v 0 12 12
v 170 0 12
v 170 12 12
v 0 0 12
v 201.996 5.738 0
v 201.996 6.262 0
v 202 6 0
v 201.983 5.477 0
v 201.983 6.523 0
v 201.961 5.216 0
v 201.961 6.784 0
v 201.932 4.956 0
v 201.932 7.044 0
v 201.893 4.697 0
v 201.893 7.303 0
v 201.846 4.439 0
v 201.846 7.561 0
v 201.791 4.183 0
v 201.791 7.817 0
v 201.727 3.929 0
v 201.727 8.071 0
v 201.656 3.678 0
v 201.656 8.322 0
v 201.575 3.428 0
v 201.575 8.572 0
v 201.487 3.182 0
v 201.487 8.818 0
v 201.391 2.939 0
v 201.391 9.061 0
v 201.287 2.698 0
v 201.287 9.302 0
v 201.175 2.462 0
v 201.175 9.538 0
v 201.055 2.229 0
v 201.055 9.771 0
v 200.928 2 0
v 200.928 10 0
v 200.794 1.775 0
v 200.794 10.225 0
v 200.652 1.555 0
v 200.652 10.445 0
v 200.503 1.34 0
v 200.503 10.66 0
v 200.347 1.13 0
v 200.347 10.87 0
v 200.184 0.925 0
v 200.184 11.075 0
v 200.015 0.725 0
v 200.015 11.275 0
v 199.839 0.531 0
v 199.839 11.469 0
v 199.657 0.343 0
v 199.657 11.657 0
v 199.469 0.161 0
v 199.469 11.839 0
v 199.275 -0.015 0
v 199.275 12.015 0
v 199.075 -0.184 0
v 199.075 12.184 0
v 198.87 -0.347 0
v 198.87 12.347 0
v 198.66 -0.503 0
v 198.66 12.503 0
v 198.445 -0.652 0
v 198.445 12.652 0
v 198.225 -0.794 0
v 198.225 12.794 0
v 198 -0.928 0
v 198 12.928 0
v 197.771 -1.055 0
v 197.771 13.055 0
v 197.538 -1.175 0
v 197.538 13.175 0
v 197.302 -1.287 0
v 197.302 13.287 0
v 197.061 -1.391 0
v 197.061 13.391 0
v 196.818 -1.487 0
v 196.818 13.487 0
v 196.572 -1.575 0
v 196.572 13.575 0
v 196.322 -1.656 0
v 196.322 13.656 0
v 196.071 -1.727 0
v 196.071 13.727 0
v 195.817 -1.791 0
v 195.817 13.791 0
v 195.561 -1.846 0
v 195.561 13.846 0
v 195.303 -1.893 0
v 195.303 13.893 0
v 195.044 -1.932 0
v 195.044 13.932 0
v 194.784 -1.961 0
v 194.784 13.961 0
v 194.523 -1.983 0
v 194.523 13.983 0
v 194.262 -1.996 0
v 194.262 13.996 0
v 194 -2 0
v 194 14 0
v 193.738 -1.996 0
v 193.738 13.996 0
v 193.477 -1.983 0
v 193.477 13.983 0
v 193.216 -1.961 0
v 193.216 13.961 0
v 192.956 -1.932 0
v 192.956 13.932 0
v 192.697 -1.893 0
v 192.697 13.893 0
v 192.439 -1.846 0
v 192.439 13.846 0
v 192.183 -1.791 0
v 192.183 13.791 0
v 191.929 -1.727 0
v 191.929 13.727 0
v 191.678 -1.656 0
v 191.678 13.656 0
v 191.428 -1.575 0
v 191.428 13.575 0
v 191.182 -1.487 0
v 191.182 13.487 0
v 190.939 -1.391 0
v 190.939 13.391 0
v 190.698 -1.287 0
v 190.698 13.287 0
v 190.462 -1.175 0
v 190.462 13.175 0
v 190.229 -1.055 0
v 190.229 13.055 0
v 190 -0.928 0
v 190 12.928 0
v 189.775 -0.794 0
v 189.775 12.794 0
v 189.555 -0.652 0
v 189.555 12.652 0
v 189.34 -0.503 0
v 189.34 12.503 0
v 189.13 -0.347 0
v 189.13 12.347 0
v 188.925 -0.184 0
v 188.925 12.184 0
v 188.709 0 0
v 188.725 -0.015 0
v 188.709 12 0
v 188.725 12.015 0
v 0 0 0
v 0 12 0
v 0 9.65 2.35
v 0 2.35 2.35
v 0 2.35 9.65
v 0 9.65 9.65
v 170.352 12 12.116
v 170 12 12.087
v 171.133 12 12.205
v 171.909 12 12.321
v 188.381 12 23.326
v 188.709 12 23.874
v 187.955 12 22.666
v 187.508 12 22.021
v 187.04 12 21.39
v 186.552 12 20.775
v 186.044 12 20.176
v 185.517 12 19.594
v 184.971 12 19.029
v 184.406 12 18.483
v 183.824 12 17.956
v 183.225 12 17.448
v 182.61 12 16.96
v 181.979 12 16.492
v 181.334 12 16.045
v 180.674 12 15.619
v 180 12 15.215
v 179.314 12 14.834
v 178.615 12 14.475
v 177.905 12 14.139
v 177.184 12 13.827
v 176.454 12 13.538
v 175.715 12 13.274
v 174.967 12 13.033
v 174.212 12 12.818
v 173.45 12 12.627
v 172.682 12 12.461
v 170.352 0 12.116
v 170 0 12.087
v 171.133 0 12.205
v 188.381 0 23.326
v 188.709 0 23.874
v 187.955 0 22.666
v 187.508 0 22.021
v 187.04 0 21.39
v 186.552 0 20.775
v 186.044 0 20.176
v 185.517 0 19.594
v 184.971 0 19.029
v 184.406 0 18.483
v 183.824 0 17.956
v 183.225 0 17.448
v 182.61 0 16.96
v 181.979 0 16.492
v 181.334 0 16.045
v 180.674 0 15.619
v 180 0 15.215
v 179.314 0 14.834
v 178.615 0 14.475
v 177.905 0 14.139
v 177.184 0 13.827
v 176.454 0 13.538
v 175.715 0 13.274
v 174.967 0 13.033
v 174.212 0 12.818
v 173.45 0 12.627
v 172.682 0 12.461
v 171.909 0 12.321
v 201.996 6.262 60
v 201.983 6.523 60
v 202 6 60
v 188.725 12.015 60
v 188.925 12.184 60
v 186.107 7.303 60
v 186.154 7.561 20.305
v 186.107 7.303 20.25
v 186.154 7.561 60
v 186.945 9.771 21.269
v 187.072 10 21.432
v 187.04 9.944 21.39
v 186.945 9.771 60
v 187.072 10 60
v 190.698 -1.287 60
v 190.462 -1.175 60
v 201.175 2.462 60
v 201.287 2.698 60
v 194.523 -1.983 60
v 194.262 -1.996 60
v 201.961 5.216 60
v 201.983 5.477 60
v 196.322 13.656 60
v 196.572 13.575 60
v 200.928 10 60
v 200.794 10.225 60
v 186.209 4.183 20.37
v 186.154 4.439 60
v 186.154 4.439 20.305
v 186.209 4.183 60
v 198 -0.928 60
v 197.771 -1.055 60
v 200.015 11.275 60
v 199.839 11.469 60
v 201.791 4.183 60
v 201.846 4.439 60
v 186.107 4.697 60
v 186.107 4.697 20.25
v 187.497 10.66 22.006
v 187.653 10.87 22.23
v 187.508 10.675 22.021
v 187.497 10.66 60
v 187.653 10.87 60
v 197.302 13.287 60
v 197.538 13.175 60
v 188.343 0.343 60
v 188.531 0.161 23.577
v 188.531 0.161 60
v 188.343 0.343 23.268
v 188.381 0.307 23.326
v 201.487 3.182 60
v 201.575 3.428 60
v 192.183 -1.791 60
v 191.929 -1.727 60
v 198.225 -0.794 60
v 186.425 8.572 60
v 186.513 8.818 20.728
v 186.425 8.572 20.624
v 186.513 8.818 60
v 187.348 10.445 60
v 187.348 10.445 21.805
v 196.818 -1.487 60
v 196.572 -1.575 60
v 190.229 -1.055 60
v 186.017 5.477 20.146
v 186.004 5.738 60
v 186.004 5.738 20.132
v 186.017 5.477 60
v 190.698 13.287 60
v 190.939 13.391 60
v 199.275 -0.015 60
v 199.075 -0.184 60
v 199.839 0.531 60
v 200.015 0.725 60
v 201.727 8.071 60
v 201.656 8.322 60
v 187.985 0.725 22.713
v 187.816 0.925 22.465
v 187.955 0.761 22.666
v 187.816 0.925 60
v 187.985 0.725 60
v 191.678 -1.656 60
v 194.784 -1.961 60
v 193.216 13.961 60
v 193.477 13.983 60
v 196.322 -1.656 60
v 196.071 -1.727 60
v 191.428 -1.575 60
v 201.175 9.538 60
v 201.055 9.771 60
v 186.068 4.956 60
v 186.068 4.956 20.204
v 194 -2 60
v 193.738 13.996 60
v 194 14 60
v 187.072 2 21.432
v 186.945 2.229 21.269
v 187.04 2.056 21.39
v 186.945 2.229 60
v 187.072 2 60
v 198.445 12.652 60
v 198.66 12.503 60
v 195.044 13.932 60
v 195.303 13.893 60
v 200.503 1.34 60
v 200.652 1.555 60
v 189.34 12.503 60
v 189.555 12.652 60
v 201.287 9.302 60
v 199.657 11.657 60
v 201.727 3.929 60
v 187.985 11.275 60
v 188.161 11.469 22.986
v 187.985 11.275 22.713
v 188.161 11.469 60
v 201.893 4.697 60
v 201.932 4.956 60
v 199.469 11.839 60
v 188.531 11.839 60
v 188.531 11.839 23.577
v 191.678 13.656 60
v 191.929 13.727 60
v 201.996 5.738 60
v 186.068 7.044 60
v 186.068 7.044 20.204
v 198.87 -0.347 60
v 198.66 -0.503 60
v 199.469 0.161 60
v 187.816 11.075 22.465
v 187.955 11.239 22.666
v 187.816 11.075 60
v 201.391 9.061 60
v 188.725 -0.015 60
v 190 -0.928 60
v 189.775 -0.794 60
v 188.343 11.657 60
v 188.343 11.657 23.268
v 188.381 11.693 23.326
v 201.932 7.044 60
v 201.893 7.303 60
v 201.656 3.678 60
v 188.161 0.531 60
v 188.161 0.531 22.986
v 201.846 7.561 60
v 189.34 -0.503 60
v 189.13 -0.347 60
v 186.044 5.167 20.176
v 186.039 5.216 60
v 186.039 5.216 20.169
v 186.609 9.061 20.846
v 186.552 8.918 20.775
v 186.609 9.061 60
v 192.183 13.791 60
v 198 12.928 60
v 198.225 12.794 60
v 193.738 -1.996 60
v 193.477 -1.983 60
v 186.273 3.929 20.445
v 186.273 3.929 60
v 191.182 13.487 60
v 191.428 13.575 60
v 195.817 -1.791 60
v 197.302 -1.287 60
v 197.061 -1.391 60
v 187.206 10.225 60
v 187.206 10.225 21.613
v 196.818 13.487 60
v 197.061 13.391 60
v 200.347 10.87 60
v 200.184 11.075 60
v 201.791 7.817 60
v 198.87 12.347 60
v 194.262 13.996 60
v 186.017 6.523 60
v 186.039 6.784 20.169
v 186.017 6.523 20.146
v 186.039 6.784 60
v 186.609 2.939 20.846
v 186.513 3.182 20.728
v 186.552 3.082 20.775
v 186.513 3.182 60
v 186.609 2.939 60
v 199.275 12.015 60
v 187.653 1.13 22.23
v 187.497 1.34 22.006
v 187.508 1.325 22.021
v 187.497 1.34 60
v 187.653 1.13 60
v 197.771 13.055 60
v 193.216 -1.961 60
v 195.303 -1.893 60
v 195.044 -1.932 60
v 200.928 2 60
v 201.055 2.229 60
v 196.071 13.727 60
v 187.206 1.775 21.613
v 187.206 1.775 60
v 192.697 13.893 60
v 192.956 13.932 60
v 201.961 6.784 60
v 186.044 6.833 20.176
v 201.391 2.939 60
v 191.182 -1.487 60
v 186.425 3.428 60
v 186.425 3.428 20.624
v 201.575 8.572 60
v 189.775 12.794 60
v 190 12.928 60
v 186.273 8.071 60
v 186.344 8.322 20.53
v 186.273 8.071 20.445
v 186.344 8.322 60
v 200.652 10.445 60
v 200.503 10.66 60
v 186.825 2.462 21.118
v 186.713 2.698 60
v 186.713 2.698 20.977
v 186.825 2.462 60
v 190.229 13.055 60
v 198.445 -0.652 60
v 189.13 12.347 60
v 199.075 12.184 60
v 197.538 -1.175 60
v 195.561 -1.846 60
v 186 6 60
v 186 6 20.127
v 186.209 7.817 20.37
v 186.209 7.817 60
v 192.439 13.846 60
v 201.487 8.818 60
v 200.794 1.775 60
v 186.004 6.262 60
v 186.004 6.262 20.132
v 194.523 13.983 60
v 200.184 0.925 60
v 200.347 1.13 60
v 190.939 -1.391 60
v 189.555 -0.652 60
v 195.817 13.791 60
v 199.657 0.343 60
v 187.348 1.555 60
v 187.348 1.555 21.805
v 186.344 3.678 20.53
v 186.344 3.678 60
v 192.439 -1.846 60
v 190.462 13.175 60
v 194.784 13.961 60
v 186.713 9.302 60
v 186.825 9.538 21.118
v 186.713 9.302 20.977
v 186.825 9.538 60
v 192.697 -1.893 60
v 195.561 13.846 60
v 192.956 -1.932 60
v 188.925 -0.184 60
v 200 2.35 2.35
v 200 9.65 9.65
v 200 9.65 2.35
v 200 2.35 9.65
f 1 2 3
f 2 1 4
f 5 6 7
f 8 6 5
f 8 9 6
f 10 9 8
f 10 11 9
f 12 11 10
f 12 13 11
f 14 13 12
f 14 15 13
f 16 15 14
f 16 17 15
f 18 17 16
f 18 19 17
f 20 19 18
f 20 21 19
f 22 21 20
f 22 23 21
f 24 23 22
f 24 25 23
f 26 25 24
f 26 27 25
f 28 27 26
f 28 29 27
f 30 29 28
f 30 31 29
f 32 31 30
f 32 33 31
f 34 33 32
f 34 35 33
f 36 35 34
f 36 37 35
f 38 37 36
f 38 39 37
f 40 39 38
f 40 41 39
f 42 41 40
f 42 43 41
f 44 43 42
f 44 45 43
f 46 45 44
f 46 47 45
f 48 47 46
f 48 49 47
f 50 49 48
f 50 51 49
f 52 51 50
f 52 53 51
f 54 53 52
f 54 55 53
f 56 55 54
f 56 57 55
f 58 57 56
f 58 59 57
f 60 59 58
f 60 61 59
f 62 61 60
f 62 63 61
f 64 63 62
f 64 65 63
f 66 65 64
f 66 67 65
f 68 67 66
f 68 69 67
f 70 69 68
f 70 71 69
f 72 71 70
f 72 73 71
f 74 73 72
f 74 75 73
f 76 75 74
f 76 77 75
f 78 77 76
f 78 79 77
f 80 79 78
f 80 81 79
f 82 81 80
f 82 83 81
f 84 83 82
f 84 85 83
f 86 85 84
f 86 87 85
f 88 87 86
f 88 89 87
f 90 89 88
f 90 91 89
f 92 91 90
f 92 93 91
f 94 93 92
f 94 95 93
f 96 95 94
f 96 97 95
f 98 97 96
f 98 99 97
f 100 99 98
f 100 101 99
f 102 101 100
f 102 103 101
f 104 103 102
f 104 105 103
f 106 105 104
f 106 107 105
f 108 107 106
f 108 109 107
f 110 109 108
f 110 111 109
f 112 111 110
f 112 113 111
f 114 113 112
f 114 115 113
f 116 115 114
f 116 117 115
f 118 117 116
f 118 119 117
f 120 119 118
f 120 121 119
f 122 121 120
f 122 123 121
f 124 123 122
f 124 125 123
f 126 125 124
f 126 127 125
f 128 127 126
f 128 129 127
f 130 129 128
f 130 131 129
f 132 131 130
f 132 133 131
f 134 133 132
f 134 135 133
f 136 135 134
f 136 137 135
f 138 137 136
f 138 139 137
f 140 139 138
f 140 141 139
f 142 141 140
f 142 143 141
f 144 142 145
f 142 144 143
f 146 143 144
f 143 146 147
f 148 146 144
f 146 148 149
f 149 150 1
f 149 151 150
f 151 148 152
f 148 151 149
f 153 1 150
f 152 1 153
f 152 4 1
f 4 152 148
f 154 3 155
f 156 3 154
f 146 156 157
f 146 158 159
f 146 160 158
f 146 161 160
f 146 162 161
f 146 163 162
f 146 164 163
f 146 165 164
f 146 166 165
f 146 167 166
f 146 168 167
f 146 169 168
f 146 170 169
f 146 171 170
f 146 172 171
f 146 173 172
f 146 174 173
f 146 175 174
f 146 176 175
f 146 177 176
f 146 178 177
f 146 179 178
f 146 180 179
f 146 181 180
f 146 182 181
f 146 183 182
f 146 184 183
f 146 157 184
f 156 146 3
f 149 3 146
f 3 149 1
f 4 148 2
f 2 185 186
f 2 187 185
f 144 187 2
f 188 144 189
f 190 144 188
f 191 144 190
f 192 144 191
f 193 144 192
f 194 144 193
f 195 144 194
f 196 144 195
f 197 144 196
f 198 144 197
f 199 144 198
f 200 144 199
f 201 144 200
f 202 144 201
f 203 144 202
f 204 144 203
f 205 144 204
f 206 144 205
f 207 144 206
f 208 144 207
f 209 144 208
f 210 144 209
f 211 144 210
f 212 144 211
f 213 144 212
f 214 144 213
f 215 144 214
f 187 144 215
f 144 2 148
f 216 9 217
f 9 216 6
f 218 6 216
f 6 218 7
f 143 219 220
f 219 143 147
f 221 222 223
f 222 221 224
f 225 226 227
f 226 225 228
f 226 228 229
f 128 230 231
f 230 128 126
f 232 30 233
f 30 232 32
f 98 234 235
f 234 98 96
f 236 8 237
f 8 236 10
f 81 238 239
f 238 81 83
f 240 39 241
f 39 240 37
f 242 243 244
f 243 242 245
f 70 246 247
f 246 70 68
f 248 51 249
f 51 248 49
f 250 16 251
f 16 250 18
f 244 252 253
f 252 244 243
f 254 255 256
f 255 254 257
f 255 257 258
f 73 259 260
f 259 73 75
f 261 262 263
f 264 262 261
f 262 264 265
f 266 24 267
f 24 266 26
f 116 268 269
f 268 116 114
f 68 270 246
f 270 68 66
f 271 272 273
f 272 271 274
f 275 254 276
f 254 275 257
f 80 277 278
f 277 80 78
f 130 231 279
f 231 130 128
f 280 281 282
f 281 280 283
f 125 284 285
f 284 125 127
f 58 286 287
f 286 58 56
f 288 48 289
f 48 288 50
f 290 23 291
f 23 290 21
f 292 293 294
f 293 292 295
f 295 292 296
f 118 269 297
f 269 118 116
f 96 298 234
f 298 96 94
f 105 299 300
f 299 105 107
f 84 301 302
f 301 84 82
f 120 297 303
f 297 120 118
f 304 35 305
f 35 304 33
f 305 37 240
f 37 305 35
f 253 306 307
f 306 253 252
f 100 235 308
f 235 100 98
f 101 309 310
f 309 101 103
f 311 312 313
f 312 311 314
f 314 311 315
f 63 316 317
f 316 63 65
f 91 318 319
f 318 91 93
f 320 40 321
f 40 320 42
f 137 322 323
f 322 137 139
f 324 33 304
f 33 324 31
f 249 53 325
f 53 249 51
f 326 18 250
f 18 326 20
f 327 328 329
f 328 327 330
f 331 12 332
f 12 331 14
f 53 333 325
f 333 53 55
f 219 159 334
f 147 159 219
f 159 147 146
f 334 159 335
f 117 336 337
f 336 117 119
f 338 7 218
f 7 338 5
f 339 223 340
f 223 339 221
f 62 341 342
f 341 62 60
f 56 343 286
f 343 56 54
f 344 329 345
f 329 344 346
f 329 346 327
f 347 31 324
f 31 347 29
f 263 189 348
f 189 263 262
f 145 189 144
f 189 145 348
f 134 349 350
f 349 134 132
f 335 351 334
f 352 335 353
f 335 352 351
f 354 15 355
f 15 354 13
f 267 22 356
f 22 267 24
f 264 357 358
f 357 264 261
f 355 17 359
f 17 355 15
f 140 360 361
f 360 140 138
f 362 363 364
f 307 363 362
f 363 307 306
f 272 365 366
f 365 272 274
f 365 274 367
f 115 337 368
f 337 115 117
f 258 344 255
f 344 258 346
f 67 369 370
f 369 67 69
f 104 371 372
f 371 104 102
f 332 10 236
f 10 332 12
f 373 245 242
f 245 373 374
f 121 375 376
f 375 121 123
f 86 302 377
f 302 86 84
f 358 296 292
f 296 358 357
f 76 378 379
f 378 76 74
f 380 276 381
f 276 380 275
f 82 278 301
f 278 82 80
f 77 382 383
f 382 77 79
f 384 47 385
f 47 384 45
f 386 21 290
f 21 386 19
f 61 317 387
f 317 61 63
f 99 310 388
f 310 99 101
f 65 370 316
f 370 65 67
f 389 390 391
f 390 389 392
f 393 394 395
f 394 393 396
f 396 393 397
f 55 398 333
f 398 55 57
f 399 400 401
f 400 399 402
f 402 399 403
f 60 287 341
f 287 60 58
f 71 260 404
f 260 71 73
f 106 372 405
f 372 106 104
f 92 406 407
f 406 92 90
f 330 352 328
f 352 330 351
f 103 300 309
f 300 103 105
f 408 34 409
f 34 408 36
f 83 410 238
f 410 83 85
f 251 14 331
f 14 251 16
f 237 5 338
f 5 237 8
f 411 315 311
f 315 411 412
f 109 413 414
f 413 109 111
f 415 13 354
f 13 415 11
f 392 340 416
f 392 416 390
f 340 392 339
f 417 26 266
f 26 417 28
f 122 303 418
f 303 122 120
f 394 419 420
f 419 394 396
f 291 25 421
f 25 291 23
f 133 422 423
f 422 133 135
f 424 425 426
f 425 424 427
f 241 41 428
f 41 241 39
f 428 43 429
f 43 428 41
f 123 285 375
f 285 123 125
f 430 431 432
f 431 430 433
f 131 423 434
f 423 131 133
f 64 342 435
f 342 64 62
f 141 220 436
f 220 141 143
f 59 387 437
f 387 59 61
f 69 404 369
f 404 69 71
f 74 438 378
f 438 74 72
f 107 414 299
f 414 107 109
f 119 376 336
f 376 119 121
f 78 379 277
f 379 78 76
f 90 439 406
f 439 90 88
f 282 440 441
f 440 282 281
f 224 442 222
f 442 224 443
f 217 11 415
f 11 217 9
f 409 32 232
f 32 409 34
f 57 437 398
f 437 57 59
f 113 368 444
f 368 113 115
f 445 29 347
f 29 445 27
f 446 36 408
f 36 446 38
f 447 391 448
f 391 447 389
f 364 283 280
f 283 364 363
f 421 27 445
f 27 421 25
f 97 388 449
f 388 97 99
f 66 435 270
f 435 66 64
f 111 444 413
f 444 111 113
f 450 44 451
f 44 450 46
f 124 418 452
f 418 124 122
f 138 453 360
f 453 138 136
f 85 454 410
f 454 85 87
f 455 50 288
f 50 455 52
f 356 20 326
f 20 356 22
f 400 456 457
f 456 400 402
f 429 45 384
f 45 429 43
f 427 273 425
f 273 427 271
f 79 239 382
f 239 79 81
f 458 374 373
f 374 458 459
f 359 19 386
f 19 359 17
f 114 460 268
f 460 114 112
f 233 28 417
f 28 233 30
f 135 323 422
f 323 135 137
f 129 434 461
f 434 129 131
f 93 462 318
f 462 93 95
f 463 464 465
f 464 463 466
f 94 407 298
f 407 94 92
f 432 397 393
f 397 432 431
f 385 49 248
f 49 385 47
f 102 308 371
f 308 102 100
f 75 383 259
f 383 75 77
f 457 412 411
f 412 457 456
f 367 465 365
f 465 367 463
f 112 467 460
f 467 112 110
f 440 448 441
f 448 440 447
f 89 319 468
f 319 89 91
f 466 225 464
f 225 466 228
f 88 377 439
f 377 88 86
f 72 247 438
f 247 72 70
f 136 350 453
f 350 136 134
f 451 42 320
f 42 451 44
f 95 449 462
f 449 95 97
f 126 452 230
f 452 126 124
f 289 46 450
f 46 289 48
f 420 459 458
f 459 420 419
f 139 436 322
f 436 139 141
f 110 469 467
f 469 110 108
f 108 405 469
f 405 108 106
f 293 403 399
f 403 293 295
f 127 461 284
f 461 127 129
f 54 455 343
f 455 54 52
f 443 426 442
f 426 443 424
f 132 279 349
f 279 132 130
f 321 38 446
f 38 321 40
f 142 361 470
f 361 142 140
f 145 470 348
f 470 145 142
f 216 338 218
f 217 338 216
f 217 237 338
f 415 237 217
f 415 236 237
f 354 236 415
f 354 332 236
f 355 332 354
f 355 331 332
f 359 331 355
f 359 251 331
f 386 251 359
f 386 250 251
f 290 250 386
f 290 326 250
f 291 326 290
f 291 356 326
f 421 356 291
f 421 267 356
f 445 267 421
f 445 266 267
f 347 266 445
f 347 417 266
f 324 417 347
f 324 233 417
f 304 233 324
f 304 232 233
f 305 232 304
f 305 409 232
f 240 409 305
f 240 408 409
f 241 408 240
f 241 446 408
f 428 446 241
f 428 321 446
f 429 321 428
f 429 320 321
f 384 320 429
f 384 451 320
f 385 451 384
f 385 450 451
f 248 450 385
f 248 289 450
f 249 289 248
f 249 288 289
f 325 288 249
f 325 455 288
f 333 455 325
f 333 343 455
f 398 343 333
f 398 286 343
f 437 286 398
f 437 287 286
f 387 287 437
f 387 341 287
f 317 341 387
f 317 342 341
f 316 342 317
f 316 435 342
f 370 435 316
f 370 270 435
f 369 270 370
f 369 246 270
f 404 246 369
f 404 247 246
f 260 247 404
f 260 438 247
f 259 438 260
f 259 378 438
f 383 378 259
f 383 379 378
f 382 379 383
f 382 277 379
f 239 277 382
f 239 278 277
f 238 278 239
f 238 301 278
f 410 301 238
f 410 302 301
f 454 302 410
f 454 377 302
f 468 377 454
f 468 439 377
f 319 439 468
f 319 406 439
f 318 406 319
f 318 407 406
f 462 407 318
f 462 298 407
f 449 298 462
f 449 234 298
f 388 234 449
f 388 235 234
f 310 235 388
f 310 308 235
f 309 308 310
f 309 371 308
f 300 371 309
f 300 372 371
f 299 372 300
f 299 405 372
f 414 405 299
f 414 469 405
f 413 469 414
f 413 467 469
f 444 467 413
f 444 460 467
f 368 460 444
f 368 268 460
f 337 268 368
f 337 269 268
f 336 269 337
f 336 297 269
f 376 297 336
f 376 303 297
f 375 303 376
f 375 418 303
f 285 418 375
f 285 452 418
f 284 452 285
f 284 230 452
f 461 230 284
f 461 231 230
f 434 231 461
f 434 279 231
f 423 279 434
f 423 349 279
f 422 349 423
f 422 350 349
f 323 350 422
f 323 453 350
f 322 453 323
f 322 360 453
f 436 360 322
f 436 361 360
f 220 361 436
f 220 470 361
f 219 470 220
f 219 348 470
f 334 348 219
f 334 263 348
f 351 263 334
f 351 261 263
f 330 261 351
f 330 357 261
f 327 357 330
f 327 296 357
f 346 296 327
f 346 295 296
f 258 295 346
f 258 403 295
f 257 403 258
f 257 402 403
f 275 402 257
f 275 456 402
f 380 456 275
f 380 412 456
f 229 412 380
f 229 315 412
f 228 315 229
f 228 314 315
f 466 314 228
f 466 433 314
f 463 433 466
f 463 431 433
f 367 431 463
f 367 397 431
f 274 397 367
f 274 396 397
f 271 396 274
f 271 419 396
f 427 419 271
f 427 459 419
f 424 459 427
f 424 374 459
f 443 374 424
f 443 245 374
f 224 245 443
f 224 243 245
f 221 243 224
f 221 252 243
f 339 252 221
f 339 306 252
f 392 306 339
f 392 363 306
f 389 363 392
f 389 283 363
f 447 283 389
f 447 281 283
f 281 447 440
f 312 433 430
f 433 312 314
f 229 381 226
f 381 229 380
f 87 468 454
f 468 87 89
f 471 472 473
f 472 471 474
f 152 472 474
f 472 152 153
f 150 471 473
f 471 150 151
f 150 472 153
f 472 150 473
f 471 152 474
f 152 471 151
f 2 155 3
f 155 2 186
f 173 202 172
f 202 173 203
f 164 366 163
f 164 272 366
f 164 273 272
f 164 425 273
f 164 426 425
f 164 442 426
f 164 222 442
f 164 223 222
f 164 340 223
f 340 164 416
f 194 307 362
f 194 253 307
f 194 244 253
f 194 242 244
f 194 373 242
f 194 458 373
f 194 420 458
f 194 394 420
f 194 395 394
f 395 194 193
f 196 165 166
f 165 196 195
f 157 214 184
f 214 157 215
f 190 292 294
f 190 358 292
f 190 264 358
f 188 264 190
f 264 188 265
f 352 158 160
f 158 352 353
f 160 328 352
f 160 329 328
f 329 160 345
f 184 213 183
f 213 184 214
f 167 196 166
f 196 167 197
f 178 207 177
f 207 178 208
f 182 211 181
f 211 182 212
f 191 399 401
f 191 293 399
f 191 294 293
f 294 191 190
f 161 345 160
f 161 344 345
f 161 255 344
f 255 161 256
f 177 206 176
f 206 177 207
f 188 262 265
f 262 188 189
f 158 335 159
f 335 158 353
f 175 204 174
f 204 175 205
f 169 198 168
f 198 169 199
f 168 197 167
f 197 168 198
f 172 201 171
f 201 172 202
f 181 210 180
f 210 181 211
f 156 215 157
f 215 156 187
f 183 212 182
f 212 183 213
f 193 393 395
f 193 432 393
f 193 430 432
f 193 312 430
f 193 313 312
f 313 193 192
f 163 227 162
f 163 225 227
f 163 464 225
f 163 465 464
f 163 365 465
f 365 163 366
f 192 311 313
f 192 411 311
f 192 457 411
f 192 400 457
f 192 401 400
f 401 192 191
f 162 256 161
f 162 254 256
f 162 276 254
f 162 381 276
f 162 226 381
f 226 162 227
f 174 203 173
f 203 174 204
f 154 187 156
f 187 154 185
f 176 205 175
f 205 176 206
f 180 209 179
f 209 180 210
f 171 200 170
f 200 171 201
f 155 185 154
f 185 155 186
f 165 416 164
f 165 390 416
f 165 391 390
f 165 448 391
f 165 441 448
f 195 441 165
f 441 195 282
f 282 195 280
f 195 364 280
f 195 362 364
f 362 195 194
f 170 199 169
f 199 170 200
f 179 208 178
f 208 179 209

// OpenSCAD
$fn = 192;
module extension() {
difference() {
  union() {
    cube([ 194, 12, 12 ], center = false );
    
    translate([ 194, 6, 0 ])
    cylinder( h = 60, r = 8, center = false );
    
    }
  translate([ 0, 2.35, 2.35 ])
  cube([ 200, 7.3, 7.3 ], center = false );
    
  }
difference() {
  union() {
    translate([ 170, 0, 12 ])
    cube([ 21, 12, 12 ]);
  }
  translate([ 168, 12, 36 ])
    rotate([ 90, 0, 0 ])
    cylinder( h = 12, r = 24 );
}
}

module test() {
  difference() {
  union() {
    cube([ 30, 12, 12 ], center = false );
    
    }
  translate([ 0, 2.35, 2.35 ])
  cube([ 200, 7.3, 7.3 ], center = false );
    
  }
}
  extension();
  //test();
